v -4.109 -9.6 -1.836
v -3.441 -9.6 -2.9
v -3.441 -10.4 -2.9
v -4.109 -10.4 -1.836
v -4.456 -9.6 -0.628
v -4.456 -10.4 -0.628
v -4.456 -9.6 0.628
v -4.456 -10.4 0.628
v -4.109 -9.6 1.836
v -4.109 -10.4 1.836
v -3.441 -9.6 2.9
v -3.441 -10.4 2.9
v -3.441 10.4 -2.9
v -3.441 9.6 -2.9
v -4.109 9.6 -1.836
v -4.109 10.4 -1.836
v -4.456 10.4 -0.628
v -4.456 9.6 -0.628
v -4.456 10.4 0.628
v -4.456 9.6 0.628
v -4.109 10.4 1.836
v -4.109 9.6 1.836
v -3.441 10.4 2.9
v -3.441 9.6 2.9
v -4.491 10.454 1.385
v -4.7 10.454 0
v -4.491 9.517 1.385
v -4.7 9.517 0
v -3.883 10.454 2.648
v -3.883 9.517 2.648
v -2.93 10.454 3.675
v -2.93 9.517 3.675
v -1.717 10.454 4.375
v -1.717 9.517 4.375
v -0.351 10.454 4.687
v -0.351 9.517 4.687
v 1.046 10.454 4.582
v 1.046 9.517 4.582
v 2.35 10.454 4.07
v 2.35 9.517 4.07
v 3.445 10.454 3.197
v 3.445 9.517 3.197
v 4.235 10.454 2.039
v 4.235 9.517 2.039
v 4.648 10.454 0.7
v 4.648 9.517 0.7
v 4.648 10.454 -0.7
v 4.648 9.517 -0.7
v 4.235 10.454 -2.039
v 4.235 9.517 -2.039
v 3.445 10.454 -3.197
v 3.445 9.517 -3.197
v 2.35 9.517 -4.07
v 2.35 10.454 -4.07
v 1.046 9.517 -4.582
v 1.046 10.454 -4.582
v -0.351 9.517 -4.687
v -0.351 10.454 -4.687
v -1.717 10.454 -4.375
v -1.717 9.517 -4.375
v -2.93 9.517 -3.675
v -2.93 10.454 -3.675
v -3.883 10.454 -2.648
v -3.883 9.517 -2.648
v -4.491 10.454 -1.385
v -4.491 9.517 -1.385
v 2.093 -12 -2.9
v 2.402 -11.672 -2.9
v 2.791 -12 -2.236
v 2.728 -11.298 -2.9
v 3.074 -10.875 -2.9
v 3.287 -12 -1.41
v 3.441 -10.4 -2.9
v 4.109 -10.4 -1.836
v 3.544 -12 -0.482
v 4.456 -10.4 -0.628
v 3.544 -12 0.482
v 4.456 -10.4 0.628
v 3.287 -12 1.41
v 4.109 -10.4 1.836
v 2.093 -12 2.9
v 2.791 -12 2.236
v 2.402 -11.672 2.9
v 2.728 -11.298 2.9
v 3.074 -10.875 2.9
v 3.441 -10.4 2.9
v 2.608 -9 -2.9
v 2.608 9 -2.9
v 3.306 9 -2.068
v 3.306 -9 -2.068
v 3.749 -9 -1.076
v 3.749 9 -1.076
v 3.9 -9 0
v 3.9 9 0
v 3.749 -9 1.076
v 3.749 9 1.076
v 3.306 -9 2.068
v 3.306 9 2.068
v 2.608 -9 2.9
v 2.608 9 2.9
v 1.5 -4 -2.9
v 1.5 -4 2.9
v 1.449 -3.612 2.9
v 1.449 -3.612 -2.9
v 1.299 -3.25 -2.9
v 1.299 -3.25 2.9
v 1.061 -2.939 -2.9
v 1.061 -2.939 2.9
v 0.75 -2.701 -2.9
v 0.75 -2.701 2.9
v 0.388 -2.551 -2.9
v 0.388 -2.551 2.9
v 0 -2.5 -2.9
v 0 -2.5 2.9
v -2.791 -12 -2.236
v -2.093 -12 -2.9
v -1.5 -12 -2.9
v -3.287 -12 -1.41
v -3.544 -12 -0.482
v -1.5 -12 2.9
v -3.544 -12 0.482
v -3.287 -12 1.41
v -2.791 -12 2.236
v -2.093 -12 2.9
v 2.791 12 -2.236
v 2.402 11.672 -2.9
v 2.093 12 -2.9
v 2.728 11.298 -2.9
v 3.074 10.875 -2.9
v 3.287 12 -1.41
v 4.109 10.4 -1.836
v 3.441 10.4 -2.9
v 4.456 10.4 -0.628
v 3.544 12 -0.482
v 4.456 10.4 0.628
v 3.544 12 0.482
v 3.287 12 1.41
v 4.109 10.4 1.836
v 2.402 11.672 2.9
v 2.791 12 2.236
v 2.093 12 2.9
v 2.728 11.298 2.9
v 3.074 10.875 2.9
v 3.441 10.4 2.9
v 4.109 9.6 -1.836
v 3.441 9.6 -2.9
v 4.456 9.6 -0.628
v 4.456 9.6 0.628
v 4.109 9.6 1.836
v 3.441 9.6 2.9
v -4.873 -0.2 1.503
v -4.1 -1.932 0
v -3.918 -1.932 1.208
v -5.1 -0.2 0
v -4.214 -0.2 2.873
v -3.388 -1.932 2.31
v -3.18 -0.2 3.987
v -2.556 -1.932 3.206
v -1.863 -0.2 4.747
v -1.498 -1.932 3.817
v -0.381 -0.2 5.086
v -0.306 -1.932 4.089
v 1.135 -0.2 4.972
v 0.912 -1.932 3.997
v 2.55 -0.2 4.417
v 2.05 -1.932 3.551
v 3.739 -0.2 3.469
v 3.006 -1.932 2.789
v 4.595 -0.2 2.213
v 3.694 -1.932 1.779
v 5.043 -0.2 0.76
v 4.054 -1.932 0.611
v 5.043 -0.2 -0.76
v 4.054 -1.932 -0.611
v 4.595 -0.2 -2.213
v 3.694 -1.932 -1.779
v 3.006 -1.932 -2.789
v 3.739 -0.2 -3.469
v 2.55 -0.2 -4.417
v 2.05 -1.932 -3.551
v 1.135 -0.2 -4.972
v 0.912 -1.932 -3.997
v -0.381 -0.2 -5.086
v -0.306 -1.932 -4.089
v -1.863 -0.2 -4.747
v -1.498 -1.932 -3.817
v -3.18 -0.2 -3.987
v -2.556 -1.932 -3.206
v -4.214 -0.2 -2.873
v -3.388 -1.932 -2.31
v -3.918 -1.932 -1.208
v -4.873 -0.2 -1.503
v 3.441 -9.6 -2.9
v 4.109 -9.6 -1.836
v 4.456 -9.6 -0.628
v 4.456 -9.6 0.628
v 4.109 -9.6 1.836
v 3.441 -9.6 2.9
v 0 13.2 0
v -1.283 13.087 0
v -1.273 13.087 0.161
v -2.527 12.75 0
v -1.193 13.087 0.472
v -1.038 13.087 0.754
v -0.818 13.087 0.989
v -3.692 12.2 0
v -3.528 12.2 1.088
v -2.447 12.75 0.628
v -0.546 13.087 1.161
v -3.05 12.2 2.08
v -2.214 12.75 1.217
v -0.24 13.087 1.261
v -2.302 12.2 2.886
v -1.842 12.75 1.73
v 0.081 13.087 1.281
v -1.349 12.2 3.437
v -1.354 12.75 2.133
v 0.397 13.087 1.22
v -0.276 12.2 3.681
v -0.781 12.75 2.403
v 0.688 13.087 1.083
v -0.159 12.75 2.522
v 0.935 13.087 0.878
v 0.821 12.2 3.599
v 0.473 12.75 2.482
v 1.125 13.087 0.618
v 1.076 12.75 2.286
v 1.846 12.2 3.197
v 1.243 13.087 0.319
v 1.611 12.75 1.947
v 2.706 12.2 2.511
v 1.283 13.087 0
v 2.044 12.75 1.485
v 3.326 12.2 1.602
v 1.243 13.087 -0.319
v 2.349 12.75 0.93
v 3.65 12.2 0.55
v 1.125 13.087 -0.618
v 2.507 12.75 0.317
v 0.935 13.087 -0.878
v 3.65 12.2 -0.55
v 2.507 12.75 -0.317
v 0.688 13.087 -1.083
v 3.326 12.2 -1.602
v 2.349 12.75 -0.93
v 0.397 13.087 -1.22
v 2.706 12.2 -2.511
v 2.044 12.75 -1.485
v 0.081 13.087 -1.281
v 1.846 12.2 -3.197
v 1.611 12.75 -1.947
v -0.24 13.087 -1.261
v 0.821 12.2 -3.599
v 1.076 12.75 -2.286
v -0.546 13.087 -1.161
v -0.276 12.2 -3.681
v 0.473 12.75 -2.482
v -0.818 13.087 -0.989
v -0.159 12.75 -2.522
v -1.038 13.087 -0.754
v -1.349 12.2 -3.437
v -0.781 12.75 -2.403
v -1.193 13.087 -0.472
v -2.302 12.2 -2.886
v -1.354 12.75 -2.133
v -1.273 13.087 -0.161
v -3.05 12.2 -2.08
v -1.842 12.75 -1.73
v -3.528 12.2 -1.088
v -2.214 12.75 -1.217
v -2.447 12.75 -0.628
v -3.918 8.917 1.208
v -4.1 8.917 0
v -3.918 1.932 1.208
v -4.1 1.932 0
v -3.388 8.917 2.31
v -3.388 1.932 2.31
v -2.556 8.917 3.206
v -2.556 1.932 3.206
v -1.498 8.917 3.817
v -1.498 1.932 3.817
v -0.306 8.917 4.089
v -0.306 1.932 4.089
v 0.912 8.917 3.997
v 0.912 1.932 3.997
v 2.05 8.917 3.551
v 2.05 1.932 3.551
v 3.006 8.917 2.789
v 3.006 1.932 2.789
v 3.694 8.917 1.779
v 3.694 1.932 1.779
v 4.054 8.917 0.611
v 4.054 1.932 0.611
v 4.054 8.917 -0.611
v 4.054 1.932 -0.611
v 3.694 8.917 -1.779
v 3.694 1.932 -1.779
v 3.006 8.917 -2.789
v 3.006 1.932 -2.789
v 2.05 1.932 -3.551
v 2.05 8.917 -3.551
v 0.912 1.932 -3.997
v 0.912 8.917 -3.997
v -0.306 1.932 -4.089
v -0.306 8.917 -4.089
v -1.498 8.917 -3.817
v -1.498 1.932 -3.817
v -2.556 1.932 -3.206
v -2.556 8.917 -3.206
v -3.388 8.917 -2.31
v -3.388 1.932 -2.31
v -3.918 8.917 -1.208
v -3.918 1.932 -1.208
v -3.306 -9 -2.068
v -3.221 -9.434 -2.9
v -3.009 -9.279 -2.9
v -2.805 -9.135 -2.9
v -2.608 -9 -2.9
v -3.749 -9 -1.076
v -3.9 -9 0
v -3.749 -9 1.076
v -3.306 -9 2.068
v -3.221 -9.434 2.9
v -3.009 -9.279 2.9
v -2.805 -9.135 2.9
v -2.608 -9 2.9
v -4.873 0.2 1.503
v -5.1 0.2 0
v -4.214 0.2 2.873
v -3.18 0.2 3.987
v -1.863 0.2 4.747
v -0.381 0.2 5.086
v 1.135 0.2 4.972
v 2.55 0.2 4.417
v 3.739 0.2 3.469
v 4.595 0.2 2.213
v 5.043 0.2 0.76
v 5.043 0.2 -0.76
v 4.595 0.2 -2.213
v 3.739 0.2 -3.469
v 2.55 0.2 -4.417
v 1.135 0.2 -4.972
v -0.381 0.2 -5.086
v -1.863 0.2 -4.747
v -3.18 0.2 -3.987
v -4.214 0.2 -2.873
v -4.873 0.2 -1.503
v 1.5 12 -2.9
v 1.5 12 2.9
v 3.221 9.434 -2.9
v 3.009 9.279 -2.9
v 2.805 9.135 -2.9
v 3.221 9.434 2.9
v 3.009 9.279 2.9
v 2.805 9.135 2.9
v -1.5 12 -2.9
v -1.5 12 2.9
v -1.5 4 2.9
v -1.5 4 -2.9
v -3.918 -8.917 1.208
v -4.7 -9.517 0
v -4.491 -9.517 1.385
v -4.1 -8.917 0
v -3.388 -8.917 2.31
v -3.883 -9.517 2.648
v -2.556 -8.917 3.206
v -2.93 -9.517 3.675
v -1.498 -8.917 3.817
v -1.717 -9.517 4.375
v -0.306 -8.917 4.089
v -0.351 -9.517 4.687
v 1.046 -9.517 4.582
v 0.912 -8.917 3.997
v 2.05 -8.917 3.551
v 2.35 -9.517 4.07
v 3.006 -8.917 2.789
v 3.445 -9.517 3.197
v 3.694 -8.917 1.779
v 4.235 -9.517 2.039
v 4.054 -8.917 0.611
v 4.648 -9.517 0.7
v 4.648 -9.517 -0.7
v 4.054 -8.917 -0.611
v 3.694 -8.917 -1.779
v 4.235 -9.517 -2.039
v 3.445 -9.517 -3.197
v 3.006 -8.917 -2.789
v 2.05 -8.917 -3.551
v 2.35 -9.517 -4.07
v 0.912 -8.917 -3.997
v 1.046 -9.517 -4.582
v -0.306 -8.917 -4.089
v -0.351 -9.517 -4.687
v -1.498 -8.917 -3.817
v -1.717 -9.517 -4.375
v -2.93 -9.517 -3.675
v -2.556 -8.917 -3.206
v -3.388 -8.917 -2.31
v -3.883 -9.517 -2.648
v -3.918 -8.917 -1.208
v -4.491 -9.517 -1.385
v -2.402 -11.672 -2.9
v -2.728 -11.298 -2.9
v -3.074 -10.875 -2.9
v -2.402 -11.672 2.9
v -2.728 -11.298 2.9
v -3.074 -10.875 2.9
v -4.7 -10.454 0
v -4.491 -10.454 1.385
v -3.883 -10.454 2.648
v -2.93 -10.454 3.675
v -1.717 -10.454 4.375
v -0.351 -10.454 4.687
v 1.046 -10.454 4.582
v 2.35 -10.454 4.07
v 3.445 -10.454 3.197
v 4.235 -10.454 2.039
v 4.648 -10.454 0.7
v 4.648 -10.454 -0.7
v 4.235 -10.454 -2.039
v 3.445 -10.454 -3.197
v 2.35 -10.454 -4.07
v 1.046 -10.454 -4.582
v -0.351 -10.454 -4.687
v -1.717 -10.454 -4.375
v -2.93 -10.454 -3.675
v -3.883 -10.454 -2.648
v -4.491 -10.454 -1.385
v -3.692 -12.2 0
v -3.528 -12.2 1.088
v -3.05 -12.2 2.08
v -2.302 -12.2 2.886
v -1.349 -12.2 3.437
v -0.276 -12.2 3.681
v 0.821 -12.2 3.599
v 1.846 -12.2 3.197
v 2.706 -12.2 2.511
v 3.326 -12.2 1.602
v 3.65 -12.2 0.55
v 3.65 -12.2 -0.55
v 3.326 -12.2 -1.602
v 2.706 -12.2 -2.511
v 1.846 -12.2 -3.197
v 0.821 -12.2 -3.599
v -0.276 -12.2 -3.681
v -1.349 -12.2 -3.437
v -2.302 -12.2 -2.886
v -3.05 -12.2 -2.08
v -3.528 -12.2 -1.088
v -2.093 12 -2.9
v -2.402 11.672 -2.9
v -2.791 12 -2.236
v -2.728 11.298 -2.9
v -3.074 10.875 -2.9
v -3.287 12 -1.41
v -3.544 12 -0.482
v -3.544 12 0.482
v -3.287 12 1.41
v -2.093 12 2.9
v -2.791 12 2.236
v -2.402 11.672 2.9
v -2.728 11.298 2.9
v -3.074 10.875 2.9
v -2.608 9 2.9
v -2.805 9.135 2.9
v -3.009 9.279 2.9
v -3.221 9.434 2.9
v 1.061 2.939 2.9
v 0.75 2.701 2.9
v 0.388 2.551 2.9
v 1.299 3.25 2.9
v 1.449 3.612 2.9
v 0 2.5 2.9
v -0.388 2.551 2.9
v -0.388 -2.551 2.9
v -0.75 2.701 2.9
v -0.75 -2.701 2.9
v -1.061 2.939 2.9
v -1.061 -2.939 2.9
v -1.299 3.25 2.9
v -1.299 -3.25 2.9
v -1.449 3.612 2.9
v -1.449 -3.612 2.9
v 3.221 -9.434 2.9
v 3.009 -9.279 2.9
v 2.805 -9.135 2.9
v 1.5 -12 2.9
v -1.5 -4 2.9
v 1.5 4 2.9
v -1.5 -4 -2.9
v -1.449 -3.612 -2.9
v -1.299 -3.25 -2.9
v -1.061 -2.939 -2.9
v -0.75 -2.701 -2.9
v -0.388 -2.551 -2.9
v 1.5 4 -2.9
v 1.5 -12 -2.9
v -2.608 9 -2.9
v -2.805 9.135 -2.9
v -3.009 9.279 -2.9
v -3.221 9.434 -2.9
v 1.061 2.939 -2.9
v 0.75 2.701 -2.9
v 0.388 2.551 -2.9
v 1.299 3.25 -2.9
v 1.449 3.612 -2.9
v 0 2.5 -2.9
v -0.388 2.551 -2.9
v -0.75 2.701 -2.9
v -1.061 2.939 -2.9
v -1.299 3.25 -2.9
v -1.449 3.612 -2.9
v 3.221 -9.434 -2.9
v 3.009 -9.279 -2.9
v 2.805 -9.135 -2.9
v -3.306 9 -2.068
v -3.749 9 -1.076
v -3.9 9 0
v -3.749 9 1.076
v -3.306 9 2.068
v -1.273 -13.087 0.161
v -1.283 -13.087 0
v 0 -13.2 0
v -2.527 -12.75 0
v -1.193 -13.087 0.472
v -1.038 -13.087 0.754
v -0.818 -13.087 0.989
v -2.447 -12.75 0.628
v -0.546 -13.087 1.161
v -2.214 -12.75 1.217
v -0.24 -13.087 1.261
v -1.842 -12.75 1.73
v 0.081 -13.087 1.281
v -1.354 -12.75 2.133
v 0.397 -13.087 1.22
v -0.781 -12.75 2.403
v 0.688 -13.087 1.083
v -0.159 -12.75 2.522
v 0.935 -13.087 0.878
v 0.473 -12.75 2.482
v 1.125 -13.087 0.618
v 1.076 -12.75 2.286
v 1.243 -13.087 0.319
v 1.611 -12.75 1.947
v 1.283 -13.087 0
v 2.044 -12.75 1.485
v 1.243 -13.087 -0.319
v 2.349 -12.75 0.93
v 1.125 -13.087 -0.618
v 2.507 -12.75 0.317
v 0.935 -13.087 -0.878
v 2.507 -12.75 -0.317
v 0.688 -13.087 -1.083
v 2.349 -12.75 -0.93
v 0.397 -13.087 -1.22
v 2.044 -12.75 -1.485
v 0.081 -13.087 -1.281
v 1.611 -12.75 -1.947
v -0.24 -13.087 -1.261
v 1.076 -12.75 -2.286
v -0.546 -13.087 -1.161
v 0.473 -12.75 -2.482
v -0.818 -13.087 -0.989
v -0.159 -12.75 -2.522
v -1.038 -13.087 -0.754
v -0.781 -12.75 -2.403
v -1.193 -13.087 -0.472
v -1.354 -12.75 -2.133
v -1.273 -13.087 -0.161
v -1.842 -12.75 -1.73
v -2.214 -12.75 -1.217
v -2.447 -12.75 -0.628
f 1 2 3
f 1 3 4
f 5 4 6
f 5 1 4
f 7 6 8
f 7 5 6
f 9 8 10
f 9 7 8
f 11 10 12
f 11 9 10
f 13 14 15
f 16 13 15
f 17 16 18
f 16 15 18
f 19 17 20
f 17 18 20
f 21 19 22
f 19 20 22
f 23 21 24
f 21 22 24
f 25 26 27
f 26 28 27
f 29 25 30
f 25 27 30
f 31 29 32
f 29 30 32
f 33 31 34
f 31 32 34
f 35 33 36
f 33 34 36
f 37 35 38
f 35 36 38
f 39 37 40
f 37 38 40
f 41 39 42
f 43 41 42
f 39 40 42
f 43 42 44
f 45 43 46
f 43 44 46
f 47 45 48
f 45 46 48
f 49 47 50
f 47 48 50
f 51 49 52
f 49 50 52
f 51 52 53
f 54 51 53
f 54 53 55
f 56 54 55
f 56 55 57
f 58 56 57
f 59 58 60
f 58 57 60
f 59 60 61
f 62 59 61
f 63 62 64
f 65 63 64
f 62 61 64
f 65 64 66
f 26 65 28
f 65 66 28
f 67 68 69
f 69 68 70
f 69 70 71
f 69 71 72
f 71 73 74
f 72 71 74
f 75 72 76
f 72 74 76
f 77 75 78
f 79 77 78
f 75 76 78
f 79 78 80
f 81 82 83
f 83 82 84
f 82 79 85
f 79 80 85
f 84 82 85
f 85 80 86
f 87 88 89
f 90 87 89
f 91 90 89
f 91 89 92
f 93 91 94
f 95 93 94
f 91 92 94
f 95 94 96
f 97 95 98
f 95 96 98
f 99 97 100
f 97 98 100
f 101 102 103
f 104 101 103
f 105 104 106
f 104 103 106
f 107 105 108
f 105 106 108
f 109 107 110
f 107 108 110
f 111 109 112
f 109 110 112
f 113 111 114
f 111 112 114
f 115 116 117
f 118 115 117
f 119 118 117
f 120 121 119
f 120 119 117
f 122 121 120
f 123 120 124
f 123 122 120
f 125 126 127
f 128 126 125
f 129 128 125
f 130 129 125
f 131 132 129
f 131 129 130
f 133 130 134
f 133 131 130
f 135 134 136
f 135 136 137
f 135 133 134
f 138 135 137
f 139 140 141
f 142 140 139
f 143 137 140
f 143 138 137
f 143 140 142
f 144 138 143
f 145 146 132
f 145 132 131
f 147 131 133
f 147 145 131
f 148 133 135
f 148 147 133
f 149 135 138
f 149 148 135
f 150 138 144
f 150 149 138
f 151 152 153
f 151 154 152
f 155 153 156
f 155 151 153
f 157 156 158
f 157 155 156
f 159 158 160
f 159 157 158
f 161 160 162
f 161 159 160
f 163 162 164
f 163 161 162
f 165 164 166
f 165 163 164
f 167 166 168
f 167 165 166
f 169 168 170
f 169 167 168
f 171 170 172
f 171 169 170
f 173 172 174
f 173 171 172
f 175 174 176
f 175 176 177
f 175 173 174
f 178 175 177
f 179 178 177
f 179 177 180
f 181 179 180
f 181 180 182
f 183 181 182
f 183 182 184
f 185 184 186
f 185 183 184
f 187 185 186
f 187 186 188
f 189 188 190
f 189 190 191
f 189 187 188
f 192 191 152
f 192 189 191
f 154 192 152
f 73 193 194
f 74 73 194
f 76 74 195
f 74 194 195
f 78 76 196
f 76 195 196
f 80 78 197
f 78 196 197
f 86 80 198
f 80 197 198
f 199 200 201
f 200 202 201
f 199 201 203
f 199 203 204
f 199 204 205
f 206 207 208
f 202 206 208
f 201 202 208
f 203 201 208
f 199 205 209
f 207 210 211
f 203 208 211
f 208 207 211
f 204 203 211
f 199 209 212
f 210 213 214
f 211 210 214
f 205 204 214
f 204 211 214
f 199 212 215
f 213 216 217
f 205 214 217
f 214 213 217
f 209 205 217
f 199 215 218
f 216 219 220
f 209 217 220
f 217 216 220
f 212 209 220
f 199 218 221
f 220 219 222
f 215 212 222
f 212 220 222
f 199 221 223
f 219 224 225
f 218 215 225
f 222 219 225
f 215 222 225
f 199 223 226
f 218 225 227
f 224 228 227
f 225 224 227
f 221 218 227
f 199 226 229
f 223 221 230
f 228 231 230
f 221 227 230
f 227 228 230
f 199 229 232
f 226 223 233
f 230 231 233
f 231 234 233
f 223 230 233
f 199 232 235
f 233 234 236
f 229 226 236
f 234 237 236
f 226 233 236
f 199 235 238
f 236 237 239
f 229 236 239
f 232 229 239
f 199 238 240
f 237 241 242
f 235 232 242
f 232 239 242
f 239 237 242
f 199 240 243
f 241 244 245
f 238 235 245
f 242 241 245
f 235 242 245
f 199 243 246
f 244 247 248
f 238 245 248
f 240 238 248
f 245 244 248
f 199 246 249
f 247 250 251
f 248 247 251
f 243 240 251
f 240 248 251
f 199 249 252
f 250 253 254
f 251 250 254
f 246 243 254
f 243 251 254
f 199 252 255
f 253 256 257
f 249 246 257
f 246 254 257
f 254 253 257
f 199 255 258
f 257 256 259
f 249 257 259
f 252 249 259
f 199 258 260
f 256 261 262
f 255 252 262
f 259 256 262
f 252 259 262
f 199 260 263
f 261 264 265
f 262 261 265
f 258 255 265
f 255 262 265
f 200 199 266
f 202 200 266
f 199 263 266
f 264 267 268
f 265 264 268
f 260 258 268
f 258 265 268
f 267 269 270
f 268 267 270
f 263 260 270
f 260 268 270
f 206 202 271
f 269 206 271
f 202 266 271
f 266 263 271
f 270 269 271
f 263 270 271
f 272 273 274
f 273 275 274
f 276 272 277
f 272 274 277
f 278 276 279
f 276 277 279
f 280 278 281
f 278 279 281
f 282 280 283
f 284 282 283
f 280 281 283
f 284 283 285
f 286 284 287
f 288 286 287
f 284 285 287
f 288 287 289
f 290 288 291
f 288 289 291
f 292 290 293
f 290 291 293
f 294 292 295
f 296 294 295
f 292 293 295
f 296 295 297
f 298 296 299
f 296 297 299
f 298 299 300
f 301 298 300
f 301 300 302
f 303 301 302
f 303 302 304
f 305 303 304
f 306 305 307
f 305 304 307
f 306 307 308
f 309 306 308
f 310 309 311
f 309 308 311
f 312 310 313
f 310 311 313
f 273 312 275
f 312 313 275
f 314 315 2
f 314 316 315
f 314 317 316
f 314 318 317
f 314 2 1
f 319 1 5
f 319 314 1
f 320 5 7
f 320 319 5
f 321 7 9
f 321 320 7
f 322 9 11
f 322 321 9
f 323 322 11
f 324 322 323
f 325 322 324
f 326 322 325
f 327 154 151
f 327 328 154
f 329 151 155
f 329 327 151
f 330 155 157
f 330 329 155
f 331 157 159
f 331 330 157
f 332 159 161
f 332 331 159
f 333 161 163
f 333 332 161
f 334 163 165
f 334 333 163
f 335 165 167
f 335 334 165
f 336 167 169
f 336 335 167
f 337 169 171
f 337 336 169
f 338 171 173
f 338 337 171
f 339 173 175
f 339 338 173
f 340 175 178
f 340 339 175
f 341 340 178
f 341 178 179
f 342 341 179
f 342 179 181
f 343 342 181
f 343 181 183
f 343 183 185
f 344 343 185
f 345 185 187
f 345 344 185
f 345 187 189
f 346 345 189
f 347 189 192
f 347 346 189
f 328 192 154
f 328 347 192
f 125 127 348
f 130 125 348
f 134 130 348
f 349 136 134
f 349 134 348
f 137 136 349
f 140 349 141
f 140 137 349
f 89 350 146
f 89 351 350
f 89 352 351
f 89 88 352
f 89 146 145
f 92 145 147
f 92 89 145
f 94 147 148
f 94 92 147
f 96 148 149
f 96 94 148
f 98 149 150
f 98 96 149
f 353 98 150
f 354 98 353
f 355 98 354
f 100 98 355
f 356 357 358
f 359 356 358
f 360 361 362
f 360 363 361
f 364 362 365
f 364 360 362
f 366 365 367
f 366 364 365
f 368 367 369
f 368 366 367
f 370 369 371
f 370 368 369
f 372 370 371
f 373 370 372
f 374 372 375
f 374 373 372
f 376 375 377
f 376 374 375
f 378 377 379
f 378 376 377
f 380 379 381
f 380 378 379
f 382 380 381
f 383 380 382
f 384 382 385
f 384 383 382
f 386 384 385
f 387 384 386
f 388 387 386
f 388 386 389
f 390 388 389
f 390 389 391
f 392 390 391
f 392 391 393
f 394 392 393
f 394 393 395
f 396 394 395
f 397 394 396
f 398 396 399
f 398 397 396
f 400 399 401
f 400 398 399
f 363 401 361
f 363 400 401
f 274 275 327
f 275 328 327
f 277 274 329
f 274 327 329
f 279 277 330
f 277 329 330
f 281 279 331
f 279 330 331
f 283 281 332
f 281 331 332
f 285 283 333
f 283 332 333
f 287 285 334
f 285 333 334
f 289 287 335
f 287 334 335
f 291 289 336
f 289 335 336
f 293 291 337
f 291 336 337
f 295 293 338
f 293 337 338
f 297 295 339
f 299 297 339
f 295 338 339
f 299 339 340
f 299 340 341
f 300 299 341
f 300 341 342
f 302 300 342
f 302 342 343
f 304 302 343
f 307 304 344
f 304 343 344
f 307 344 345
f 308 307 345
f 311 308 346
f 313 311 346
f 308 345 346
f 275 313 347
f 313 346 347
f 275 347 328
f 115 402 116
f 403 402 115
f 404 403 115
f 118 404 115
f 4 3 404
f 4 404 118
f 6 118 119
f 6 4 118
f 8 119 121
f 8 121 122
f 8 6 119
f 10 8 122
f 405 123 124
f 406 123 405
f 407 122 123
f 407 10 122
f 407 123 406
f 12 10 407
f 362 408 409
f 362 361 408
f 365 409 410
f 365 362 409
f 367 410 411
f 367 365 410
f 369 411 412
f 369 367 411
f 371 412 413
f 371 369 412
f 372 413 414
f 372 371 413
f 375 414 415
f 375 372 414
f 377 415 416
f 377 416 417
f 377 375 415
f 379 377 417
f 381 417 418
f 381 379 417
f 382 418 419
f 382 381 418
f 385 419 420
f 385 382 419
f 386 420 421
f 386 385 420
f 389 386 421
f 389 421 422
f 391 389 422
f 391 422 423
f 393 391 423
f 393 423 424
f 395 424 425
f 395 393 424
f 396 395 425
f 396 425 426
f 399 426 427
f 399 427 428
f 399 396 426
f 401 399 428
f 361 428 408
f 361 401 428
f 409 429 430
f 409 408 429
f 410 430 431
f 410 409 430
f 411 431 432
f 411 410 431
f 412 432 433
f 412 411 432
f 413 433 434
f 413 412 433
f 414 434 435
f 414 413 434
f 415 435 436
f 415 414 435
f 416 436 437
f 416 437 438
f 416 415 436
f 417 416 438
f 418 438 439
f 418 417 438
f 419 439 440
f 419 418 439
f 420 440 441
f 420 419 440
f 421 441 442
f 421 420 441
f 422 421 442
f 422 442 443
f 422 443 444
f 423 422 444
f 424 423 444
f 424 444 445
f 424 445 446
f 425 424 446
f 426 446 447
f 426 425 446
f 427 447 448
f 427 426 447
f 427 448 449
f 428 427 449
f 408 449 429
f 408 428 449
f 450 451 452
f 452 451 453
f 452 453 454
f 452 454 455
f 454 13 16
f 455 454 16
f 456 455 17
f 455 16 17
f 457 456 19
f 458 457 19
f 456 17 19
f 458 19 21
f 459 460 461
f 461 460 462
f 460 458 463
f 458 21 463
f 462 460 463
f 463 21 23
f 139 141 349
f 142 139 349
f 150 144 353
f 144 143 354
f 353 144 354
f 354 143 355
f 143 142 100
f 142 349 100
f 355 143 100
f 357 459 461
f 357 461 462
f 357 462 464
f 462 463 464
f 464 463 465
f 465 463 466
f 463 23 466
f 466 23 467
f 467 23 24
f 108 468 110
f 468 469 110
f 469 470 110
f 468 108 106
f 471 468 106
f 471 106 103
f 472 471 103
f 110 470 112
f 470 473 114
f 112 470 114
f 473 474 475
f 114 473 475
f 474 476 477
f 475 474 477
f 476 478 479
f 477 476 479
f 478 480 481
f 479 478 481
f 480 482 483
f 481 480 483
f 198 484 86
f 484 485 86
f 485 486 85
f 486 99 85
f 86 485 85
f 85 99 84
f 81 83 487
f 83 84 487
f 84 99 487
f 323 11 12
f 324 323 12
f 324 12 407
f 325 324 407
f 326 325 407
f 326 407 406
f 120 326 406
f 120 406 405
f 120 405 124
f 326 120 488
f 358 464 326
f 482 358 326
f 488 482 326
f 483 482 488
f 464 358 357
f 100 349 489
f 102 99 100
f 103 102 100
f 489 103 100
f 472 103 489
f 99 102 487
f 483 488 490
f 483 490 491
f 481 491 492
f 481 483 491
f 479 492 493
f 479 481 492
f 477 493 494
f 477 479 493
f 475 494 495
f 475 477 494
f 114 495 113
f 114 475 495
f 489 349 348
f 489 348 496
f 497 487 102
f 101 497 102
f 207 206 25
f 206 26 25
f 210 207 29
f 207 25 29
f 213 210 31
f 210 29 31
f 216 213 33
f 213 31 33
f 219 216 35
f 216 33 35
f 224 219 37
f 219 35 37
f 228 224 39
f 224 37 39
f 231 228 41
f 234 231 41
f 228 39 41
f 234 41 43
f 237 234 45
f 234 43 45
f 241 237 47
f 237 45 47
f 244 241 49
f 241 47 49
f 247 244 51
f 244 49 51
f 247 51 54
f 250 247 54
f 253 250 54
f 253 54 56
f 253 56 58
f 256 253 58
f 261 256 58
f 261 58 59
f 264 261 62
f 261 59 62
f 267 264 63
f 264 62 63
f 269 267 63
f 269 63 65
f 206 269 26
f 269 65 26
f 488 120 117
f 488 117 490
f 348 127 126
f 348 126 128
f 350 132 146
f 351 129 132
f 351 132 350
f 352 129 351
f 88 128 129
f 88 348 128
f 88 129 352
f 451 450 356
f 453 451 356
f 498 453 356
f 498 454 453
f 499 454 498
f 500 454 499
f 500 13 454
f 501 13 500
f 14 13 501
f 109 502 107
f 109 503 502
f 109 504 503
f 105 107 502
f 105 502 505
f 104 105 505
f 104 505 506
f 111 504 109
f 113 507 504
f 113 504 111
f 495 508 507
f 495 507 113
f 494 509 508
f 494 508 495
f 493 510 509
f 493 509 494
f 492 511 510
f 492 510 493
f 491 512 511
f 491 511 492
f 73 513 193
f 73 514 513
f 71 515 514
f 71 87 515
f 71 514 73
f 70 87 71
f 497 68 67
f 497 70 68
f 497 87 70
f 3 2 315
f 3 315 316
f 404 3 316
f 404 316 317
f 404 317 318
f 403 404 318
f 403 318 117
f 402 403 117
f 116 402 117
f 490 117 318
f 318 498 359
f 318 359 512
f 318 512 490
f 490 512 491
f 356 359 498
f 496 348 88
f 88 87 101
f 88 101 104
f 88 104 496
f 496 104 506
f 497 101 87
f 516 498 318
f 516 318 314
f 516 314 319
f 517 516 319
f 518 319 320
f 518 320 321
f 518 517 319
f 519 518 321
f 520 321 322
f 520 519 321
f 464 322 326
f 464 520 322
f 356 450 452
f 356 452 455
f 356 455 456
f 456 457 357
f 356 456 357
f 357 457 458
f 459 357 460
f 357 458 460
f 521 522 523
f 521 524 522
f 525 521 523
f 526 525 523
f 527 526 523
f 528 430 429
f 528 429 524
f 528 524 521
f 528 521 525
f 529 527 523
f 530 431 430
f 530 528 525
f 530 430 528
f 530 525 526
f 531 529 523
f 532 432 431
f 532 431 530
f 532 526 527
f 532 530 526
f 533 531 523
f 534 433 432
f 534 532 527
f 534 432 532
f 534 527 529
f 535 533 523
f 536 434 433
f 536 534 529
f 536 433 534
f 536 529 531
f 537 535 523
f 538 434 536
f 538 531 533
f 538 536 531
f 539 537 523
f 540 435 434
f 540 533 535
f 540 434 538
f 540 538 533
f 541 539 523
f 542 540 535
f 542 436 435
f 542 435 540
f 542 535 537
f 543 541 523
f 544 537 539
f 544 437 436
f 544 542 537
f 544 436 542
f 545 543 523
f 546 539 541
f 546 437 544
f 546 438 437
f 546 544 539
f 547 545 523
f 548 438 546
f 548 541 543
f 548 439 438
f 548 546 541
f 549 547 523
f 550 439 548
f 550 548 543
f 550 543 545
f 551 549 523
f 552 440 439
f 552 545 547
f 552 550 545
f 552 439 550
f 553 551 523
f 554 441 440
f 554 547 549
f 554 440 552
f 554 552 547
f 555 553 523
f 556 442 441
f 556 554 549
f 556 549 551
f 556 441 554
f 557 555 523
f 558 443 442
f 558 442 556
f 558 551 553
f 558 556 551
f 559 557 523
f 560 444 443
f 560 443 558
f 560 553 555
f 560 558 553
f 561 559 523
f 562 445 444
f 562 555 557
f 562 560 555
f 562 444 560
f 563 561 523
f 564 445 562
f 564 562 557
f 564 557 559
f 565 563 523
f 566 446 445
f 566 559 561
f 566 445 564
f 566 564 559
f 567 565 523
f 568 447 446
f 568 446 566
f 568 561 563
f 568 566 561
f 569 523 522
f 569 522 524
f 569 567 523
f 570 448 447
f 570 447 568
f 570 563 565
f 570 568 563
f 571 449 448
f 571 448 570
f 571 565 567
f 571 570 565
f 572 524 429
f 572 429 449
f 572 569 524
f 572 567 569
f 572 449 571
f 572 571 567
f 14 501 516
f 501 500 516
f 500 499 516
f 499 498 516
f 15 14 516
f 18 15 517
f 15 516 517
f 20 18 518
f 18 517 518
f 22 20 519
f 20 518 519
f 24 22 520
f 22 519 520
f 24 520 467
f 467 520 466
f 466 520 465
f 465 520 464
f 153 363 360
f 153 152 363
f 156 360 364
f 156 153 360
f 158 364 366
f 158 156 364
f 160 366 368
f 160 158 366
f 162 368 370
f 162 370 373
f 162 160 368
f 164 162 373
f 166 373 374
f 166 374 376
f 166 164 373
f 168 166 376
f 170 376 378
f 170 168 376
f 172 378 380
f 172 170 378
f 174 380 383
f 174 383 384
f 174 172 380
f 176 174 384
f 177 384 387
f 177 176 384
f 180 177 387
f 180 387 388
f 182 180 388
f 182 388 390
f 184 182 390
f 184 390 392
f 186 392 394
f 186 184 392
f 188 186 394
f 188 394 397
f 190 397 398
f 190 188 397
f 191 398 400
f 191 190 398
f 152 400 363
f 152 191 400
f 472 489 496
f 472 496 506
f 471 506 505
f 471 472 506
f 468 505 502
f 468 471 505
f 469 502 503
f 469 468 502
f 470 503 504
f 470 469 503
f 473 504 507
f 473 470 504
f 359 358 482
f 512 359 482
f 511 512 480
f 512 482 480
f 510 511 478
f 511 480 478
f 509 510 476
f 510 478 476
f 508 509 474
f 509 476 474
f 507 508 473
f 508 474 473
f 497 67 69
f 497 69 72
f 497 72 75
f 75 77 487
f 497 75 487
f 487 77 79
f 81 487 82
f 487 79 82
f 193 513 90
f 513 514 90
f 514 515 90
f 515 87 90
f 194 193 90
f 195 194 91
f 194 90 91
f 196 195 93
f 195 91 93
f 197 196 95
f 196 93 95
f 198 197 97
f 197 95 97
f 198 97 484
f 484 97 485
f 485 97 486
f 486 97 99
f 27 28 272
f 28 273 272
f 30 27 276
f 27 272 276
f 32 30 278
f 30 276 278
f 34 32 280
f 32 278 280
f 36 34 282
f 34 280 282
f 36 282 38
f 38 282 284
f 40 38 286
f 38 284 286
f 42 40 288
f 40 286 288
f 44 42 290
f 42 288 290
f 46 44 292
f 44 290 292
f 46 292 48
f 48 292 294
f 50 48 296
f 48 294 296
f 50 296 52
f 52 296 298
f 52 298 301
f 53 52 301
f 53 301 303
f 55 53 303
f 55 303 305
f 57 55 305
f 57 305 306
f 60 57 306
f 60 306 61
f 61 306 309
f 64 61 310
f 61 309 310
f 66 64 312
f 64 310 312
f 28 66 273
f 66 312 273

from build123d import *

# Parameters (mm, degrees)
F3_ANGLE_BACK = 90
F3_ANGLE      = 180
F4_DEPTH      = 4.501
F4_DEPTH_BACK = 4.501
F1_W          = 12
F1_H          = 1.6
F5_DEPTH      = 4.501


with BuildPart() as f3:
    # F0 (on Top) → F3 (revolve)
    with BuildSketch(Plane.XY, mode=Mode.PRIVATE) as f3_sk:
        with BuildLine():
            Line((-3.576239677, 12), (-4.5, 10.4000001865))
            Line((-4.5, 10.4000001865), (-4.5, 9.6000001865))
            Line((-4.5, 9.6000001865), (-3.9, 9.0000001865))
            Line((-3.9, 9.0000001865), (-3.9, 0))
            Line((-3.9, 0), (0, 0))
            Line((0, 0), (0, 2.5))
            ThreePointArc((0, 2.5), (-1.0606601718, 2.9393398282), (-1.5, 4))
            Line((-1.5, 4), (-1.5, 12))
            Line((-1.5, 12), (-3.576239677, 12))
        make_face()
    revolve(f3_sk.sketch.rotate(Axis((0, 7.25, 0), (0, 1, 0)), -F3_ANGLE_BACK), axis=Axis((0, 7.25, 0), (0, 1, 0)), revolution_arc=F3_ANGLE)

    # F0 (on Top) → F4 (cut, two sides)
    with BuildSketch(Plane.XY) as f4_sk:
        with BuildLine():
            Line((0, 12), (-1.5, 12))
            Line((-1.5, 12), (-1.5, 4))
            ThreePointArc((-1.5, 4), (-1.0606601718, 2.9393398282), (0, 2.5))
            Line((0, 2.5), (0, 12))
        make_face()
    extrude(amount=F4_DEPTH, mode=Mode.SUBTRACT)
    extrude(f4_sk.sketch, amount=-F4_DEPTH_BACK, mode=Mode.SUBTRACT)

    # F1 (on Right) → F5 (cut, through all)
    with BuildSketch(Plane.YZ):
        with Locations((6, 3.7)):
            Rectangle(F1_W, F1_H)
        with Locations((6, -3.7)):
            Rectangle(F1_W, F1_H)
    extrude(amount=-F5_DEPTH, mode=Mode.SUBTRACT)

    # F6: F3 across plane


with BuildPart() as f3_1:
    add(f3.part)
    add(f3.part.mirror(Plane.YZ))

    # F7: F3 across plane


with BuildPart() as f3_2:
    add(f3_1.part)
    add(f3_1.part.mirror(Plane.XZ))


with BuildPart() as f8:
    # F2 (on Top) → F8 (revolve)
    with BuildSketch(Plane.XY):
        with BuildLine():
            Line((-4.1, 8.917157474), (-4.1, 1.932051))
            Line((-4.1, 1.932051), (-5.1, 0.2))
            Line((-5.1, 0.2), (-5.1, 0))
            Line((-5.1, 0), (0, 0))
            Line((0, 0), (0, 13.2))
            ThreePointArc((0, 13.2), (-1.9123755343, 12.9455750006), (-3.6917097308, 12.2))
            Line((-3.6917097308, 12.2), (-4.7, 10.453590025))
            Line((-4.7, 10.453590025), (-4.7, 9.517157474))
            Line((-4.7, 9.517157474), (-4.1, 8.917157474))
        make_face()
    revolve(axis=Axis((0, 6.6, 0), (0, 1, 0)))

    # F9: F8 across plane


with BuildPart() as f8_1:
    add(f8.part)
    add(f8.part.mirror(Plane.XZ))


solid = Compound([f3_2.part, f8_1.part])
